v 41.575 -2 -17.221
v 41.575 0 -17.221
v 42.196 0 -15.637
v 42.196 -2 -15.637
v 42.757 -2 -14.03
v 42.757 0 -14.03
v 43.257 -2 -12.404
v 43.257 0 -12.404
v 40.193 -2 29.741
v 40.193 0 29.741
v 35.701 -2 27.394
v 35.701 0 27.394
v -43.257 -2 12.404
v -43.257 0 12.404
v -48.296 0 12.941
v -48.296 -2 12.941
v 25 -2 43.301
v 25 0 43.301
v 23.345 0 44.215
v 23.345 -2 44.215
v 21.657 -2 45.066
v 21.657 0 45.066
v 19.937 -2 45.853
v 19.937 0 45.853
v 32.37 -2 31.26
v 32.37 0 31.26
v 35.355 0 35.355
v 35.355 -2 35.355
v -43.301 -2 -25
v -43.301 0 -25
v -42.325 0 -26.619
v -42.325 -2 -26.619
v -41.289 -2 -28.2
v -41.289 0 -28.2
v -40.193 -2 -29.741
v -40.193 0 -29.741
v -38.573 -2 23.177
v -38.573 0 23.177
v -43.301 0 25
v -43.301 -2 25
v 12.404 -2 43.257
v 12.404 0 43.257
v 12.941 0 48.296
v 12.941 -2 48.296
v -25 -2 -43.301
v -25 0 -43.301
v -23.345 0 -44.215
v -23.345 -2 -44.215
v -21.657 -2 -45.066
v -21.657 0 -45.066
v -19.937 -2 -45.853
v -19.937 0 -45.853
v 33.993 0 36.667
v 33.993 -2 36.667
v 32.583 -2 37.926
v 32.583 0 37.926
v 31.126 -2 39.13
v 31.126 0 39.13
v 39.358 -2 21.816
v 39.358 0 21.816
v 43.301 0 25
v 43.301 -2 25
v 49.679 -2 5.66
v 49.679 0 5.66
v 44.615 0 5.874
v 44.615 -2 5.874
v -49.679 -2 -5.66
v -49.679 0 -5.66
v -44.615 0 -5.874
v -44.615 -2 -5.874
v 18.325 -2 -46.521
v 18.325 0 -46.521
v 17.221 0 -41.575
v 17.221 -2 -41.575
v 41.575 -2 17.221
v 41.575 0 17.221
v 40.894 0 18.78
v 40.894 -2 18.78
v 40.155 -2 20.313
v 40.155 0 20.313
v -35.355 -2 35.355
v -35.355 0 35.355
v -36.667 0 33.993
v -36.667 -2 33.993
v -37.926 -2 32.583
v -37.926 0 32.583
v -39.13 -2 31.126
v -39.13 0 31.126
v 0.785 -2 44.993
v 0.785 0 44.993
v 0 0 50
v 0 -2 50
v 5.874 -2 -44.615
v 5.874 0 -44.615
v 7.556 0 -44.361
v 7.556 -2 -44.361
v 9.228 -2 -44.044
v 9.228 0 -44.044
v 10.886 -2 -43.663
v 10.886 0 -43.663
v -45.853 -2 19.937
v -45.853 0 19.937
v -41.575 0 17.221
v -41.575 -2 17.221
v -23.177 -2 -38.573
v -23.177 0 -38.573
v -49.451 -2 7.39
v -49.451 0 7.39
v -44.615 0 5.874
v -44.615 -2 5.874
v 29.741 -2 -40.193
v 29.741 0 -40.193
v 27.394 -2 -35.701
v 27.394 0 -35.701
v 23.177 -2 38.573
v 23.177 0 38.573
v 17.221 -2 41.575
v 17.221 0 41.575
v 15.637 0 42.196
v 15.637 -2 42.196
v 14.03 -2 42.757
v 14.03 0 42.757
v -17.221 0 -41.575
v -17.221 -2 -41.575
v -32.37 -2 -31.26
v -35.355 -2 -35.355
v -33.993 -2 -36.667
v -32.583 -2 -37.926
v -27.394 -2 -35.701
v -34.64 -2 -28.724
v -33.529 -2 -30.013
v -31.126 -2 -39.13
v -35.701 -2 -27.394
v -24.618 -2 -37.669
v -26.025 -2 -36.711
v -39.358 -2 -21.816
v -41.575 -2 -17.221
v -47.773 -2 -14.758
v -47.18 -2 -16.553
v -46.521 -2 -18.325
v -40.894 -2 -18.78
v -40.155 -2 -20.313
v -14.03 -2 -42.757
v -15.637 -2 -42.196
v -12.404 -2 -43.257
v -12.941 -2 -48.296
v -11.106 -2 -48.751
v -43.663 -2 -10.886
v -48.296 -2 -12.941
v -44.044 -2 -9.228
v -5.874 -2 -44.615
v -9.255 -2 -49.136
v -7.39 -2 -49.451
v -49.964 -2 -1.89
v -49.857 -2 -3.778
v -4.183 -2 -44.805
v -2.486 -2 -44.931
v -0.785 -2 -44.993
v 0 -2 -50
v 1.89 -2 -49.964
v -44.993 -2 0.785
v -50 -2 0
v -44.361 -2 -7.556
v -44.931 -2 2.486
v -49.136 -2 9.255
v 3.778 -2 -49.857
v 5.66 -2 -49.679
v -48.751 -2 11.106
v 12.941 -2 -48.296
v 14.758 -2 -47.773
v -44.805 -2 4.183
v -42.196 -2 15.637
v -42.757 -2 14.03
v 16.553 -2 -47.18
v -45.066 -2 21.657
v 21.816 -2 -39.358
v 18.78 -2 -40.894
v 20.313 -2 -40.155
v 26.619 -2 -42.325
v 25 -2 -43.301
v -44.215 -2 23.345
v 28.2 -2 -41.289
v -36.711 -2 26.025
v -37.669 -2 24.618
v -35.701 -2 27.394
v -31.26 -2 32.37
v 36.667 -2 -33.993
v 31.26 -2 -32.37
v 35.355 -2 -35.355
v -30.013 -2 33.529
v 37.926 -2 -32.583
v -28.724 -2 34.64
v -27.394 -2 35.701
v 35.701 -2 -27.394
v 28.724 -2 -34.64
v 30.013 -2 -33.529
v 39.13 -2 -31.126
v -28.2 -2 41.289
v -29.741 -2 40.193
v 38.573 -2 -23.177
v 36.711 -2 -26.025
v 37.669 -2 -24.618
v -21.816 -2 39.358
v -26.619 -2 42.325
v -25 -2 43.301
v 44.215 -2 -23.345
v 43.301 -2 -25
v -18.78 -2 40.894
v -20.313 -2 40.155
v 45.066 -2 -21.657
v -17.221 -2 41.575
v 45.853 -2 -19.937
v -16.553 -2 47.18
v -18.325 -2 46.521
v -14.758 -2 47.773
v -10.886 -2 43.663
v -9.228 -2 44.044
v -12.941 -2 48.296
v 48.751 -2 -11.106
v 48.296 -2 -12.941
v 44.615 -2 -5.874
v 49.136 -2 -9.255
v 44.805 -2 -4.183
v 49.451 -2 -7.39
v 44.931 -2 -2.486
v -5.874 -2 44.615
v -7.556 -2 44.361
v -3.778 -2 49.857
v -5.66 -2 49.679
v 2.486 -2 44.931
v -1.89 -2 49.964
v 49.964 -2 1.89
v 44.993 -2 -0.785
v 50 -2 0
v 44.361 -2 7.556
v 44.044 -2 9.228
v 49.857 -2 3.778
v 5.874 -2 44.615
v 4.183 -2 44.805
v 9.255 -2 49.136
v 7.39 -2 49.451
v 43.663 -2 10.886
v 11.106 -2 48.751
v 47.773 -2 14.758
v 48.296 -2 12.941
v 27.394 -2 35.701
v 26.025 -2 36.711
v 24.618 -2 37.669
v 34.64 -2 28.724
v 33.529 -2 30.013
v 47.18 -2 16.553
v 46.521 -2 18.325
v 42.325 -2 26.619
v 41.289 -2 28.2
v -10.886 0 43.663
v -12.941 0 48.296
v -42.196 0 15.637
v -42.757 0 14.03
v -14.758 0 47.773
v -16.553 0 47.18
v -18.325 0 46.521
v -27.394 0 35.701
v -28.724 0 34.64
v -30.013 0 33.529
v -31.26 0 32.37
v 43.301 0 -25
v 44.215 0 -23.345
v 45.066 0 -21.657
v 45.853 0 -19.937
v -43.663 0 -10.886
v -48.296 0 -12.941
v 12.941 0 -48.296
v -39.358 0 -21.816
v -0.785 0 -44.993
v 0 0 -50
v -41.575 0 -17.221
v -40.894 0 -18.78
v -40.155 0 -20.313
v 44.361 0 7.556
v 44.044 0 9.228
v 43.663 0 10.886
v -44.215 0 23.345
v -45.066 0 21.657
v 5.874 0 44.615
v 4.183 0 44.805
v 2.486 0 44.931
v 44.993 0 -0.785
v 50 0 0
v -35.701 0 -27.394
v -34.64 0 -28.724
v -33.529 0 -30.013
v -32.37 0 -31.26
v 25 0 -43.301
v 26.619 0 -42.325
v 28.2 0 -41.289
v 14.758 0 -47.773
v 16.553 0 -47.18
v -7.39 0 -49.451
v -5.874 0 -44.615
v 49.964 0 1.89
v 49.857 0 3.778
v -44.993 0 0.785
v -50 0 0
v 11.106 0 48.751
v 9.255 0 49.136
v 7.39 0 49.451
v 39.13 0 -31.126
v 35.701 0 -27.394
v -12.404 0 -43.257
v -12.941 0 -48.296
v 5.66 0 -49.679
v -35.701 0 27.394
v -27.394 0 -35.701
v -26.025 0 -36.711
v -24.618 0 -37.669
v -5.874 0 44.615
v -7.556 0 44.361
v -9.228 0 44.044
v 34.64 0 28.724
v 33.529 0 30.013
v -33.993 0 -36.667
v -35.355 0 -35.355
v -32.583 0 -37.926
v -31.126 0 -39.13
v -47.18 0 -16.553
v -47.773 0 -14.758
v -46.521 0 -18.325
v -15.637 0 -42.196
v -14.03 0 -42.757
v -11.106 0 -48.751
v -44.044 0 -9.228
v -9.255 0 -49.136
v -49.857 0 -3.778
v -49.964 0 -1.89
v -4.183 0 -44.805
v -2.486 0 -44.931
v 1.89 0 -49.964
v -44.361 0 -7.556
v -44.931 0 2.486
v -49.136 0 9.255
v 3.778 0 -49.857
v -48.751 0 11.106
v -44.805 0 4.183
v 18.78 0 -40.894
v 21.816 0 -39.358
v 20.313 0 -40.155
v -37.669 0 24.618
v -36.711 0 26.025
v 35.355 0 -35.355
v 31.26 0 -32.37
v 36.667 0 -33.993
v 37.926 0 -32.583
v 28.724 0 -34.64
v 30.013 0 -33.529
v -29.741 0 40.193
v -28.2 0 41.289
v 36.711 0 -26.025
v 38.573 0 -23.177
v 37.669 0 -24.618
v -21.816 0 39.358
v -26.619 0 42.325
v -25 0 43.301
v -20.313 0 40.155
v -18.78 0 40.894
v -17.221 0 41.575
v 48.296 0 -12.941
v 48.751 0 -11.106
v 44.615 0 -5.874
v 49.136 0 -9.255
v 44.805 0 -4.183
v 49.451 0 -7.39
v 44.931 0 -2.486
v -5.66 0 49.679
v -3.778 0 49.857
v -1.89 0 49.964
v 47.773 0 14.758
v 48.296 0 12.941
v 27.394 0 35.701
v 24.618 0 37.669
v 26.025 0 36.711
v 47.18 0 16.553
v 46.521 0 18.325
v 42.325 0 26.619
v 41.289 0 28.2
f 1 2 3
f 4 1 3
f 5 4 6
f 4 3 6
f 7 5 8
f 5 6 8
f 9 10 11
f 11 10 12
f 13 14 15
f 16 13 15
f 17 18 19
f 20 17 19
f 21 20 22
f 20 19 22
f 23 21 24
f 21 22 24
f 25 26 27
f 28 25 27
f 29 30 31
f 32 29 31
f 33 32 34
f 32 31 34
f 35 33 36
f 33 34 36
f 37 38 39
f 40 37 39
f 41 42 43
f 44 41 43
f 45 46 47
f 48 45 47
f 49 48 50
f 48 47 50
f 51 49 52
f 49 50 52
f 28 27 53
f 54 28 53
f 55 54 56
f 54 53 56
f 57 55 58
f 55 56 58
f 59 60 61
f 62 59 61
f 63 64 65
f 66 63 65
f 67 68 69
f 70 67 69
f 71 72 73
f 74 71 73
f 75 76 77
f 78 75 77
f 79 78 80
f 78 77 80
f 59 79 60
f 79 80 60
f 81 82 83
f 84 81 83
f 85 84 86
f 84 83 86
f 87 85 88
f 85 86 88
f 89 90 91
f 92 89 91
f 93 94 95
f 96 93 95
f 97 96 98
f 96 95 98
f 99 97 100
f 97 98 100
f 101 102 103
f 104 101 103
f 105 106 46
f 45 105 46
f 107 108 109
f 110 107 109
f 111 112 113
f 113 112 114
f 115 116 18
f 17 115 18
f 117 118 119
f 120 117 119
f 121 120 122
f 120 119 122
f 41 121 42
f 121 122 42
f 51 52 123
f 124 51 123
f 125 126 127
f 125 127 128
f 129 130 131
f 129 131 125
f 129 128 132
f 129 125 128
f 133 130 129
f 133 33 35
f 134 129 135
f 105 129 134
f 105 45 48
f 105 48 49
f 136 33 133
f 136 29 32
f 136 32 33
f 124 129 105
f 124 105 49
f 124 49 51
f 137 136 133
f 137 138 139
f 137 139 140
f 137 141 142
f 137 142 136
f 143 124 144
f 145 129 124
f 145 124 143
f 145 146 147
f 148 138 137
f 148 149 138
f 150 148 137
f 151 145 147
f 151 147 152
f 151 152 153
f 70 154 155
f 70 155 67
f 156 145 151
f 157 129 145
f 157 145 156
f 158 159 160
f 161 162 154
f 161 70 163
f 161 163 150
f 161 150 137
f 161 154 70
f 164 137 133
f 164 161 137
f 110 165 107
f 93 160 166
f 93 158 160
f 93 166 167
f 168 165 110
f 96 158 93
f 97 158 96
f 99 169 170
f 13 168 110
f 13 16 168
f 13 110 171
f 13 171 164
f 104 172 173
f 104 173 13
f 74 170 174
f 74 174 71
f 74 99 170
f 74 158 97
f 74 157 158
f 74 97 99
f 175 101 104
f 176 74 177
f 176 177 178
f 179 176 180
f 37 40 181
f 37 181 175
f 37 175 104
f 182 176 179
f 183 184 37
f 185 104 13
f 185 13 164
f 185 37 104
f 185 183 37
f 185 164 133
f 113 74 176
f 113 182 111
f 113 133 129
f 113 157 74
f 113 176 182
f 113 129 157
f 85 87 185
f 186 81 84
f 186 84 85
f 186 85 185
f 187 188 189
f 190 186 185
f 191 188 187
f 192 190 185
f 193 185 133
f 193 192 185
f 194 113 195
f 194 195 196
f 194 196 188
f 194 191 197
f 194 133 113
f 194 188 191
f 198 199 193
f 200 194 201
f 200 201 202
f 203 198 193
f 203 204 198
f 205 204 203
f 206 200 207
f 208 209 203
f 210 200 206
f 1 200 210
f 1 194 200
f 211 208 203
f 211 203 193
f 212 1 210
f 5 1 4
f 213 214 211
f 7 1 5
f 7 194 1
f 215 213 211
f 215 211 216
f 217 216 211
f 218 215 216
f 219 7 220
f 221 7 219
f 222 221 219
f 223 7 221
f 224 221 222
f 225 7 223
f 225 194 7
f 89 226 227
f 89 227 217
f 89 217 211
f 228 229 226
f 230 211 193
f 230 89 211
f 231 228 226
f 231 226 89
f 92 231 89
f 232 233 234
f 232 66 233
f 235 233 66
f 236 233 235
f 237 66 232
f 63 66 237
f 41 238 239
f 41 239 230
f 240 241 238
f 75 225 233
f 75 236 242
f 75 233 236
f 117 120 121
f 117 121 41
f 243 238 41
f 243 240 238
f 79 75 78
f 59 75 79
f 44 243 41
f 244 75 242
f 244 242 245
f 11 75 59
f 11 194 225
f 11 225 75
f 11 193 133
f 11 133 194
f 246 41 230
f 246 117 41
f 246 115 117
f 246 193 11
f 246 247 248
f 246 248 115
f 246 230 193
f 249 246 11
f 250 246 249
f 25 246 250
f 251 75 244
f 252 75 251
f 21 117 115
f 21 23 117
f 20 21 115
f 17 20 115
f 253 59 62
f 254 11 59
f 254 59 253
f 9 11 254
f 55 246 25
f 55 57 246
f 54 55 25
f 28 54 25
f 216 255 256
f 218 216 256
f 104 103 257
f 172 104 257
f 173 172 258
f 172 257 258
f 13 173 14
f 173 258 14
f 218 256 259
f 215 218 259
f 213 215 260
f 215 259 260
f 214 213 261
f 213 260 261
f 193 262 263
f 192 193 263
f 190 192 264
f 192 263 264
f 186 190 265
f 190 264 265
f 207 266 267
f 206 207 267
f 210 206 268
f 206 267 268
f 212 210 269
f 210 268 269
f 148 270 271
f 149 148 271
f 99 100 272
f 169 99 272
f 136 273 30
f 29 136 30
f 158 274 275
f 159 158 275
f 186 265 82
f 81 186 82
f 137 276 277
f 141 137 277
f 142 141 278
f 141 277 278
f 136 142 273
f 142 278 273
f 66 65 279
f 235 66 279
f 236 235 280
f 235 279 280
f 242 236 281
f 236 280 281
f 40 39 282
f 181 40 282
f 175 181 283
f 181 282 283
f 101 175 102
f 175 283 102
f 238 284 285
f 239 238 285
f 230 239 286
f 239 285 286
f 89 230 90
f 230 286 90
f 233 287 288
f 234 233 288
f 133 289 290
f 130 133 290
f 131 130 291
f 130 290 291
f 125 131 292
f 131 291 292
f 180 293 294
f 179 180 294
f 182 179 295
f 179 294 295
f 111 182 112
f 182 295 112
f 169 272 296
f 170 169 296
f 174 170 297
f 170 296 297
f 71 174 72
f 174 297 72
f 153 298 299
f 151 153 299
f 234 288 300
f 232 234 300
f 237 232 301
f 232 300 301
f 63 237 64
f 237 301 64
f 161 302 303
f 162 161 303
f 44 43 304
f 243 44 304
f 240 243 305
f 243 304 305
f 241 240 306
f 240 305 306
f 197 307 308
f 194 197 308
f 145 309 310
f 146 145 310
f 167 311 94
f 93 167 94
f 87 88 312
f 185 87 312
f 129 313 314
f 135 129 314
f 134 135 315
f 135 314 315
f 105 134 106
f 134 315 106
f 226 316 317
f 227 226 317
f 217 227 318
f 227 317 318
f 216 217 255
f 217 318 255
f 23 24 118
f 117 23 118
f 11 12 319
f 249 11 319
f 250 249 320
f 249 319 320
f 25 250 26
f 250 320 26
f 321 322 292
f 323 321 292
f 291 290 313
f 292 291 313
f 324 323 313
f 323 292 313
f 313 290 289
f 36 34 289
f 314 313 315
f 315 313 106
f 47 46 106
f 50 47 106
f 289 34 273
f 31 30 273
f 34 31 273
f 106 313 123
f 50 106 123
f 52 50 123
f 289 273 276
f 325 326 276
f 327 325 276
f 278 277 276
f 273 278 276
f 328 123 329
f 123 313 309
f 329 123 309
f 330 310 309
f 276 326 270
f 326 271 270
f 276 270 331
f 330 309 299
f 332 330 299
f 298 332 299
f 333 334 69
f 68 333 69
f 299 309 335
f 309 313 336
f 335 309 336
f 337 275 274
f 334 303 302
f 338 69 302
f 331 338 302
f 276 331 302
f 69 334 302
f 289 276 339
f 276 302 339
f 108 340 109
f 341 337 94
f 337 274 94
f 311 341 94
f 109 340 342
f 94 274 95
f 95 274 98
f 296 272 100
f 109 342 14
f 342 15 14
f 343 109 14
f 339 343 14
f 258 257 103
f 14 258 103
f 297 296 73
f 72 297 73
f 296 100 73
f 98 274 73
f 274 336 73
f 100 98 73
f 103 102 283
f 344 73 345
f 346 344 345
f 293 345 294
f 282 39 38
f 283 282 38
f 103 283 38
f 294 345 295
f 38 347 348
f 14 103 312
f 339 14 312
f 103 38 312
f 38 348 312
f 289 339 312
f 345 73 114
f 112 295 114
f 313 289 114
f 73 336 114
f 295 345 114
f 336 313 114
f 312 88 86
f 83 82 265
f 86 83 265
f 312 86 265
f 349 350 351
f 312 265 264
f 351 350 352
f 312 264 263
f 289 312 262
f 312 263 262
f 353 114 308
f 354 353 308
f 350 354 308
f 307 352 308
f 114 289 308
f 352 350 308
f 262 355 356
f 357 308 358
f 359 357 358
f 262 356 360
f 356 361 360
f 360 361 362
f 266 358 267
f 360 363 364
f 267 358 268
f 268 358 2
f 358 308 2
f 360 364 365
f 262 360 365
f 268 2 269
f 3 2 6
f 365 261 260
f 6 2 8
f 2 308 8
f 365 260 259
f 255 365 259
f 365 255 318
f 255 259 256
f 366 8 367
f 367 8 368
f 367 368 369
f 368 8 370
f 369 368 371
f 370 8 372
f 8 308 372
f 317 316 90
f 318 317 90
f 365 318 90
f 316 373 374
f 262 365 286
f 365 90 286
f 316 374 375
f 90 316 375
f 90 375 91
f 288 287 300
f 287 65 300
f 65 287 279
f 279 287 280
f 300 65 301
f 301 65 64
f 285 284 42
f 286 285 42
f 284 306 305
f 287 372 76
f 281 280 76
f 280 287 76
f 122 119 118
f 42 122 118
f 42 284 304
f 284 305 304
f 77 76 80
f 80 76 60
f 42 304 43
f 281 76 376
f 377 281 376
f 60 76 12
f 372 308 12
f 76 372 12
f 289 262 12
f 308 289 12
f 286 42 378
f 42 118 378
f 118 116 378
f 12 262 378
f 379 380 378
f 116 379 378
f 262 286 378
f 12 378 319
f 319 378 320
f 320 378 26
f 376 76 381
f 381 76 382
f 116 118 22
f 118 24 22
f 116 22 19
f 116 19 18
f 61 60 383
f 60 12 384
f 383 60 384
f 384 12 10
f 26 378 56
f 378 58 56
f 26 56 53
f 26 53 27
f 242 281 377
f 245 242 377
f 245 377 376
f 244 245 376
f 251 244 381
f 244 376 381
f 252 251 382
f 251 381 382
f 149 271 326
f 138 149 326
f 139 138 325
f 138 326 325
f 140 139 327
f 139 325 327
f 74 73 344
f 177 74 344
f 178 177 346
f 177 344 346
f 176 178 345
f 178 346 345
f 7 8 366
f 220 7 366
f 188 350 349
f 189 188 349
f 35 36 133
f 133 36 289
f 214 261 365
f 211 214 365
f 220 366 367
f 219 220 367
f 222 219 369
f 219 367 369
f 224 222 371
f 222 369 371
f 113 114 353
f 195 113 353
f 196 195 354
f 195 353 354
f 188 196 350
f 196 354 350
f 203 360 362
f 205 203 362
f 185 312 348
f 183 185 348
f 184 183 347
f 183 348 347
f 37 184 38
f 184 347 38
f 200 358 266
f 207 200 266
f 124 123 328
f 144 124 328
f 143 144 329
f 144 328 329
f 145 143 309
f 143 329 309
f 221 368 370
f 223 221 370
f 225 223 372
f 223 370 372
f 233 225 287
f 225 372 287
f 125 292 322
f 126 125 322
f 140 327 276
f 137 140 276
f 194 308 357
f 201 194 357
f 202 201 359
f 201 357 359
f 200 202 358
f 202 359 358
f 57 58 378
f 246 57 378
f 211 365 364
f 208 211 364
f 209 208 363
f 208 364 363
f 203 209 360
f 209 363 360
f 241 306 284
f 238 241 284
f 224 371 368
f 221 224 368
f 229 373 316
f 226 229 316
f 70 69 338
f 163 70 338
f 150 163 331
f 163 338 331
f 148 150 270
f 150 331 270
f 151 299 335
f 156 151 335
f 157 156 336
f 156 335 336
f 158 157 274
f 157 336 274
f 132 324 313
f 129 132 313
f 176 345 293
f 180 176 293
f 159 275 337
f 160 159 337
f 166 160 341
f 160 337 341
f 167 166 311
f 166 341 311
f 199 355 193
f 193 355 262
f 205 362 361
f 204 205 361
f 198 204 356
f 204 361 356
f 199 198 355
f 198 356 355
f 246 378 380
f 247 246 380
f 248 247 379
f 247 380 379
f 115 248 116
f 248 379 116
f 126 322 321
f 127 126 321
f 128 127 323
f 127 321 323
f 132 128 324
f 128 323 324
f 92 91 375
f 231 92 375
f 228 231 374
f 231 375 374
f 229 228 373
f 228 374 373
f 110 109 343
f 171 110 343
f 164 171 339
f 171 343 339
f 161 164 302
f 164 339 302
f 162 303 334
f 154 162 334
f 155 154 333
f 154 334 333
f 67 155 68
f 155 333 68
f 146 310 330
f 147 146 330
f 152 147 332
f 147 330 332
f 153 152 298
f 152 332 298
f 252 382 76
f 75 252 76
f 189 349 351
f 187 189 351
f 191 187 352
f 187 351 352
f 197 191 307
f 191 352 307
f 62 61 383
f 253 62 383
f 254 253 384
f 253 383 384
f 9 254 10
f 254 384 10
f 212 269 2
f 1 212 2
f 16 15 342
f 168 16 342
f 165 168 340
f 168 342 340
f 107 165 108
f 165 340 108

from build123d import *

# Parameters (mm, degrees)
F1_DEPTH = 2


with BuildPart() as f1:
    # F0 (on Front) → F1 (new body)
    with BuildSketch(Plane.XZ):
        with BuildLine():
            Line((-5.660161, 49.678593), (-5.873679, 44.615019))
            ThreePointArc((-5.873679, 44.615019), (-8.393582, 44.210268), (-10.886485, 43.663308))
            Line((-10.886485, 43.663308), (-12.940952, 48.296291))
            ThreePointArc((-12.940952, 48.296291), (-15.65819, 47.484956), (-18.325061, 46.520878))
            Line((-18.325061, 46.520878), (-17.220754, 41.574579))
            ThreePointArc((-17.220754, 41.574579), (-19.550037, 40.531421), (-21.816433, 39.357887))
            Line((-21.816433, 39.357887), (-25, 43.30127))
            ThreePointArc((-25, 43.30127), (-27.414661, 41.814308), (-29.741139, 40.192843))
            Line((-29.741139, 40.192843), (-27.394264, 35.7009))
            ThreePointArc((-27.394264, 35.7009), (-29.374189, 34.090424), (-31.259627, 32.370291))
            Line((-31.259627, 32.370291), (-35.355339, 35.355339))
            ThreePointArc((-35.355339, 35.355339), (-37.302869, 33.294083), (-39.130408, 31.125732))
            Line((-39.130408, 31.125732), (-35.7009, 27.394264))
            ThreePointArc((-35.7009, 27.394264), (-37.196539, 25.326222), (-38.572529, 23.176713))
            Line((-38.572529, 23.176713), (-43.30127, 25))
            ThreePointArc((-43.30127, 25), (-44.648947, 22.504922), (-45.853004, 19.937453))
            Line((-45.853004, 19.937453), (-41.574579, 17.220754))
            ThreePointArc((-41.574579, 17.220754), (-42.484006, 14.836079), (-43.256776, 12.403681))
            Line((-43.256776, 12.403681), (-48.296291, 12.940952))
            ThreePointArc((-48.296291, 12.940952), (-48.952274, 10.182088), (-49.450793, 7.390471))
            Line((-49.450793, 7.390471), (-44.615019, 5.873679))
            ThreePointArc((-44.615019, 5.873679), (-44.876258, 3.334882), (-44.993146, 0.785358))
            Line((-44.993146, 0.785358), (-50, 0))
            ThreePointArc((-50, 0), (-49.919584, -2.834639), (-49.678593, -5.660161))
            Line((-49.678593, -5.660161), (-44.615019, -5.873679))
            ThreePointArc((-44.615019, -5.873679), (-44.210268, -8.393582), (-43.663308, -10.886485))
            Line((-43.663308, -10.886485), (-48.296291, -12.940952))
            ThreePointArc((-48.296291, -12.940952), (-47.484956, -15.65819), (-46.520878, -18.325061))
            Line((-46.520878, -18.325061), (-41.574579, -17.220754))
            ThreePointArc((-41.574579, -17.220754), (-40.531421, -19.550037), (-39.357887, -21.816433))
            Line((-39.357887, -21.816433), (-43.30127, -25))
            ThreePointArc((-43.30127, -25), (-41.814308, -27.414661), (-40.192843, -29.741139))
            Line((-40.192843, -29.741139), (-35.7009, -27.394264))
            ThreePointArc((-35.7009, -27.394264), (-34.090424, -29.374189), (-32.370291, -31.259627))
            Line((-32.370291, -31.259627), (-35.355339, -35.355339))
            ThreePointArc((-35.355339, -35.355339), (-33.294083, -37.302869), (-31.125732, -39.130408))
            Line((-31.125732, -39.130408), (-27.394264, -35.7009))
            ThreePointArc((-27.394264, -35.7009), (-25.326222, -37.196539), (-23.176713, -38.572529))
            Line((-23.176713, -38.572529), (-25, -43.30127))
            ThreePointArc((-25, -43.30127), (-22.504922, -44.648947), (-19.937453, -45.853004))
            Line((-19.937453, -45.853004), (-17.220754, -41.574579))
            ThreePointArc((-17.220754, -41.574579), (-14.836079, -42.484006), (-12.403681, -43.256776))
            Line((-12.403681, -43.256776), (-12.940952, -48.296291))
            ThreePointArc((-12.940952, -48.296291), (-10.182088, -48.952274), (-7.390471, -49.450793))
            Line((-7.390471, -49.450793), (-5.873679, -44.615019))
            ThreePointArc((-5.873679, -44.615019), (-3.334882, -44.876258), (-0.785358, -44.993146))
            Line((-0.785358, -44.993146), (0, -50))
            ThreePointArc((0, -50), (2.834639, -49.919584), (5.660161, -49.678593))
            Line((5.660161, -49.678593), (5.873679, -44.615019))
            ThreePointArc((5.873679, -44.615019), (8.393582, -44.210268), (10.886485, -43.663308))
            Line((10.886485, -43.663308), (12.940952, -48.296291))
            ThreePointArc((12.940952, -48.296291), (15.65819, -47.484956), (18.325061, -46.520878))
            Line((18.325061, -46.520878), (17.220754, -41.574579))
            ThreePointArc((17.220754, -41.574579), (19.550037, -40.531421), (21.816433, -39.357887))
            Line((21.816433, -39.357887), (25, -43.30127))
            ThreePointArc((25, -43.30127), (27.414661, -41.814308), (29.741139, -40.192843))
            Line((29.741139, -40.192843), (27.394264, -35.7009))
            ThreePointArc((27.394264, -35.7009), (29.374189, -34.090424), (31.259627, -32.370291))
            Line((31.259627, -32.370291), (35.355339, -35.355339))
            ThreePointArc((35.355339, -35.355339), (37.302869, -33.294083), (39.130408, -31.125732))
            Line((39.130408, -31.125732), (35.7009, -27.394264))
            ThreePointArc((35.7009, -27.394264), (37.196539, -25.326222), (38.572529, -23.176713))
            Line((38.572529, -23.176713), (43.30127, -25))
            ThreePointArc((43.30127, -25), (44.648947, -22.504922), (45.853004, -19.937453))
            Line((45.853004, -19.937453), (41.574579, -17.220754))
            ThreePointArc((41.574579, -17.220754), (42.484006, -14.836079), (43.256776, -12.403681))
            Line((43.256776, -12.403681), (48.296291, -12.940952))
            ThreePointArc((48.296291, -12.940952), (48.952274, -10.182088), (49.450793, -7.390471))
            Line((49.450793, -7.390471), (44.615019, -5.873679))
            ThreePointArc((44.615019, -5.873679), (44.876258, -3.334882), (44.993146, -0.785358))
            Line((44.993146, -0.785358), (50, 0))
            ThreePointArc((50, 0), (49.919584, 2.834639), (49.678593, 5.660161))
            Line((49.678593, 5.660161), (44.615019, 5.873679))
            ThreePointArc((44.615019, 5.873679), (44.210268, 8.393582), (43.663308, 10.886485))
            Line((43.663308, 10.886485), (48.296291, 12.940952))
            ThreePointArc((48.296291, 12.940952), (47.484956, 15.65819), (46.520878, 18.325061))
            Line((46.520878, 18.325061), (41.574579, 17.220754))
            ThreePointArc((41.574579, 17.220754), (40.531421, 19.550037), (39.357887, 21.816433))
            Line((39.357887, 21.816433), (43.30127, 25))
            ThreePointArc((43.30127, 25), (41.814308, 27.414661), (40.192843, 29.741139))
            Line((40.192843, 29.741139), (35.7009, 27.394264))
            ThreePointArc((35.7009, 27.394264), (34.090424, 29.374189), (32.370291, 31.259627))
            Line((32.370291, 31.259627), (35.355339, 35.355339))
            ThreePointArc((35.355339, 35.355339), (33.294083, 37.302869), (31.125732, 39.130408))
            Line((31.125732, 39.130408), (27.394264, 35.7009))
            ThreePointArc((27.394264, 35.7009), (25.326222, 37.196539), (23.176713, 38.572529))
            Line((23.176713, 38.572529), (25, 43.30127))
            ThreePointArc((25, 43.30127), (22.504922, 44.648947), (19.937453, 45.853004))
            Line((19.937453, 45.853004), (17.220754, 41.574579))
            ThreePointArc((17.220754, 41.574579), (14.836079, 42.484006), (12.403681, 43.256776))
            Line((12.403681, 43.256776), (12.940952, 48.296291))
            ThreePointArc((12.940952, 48.296291), (10.182088, 48.952274), (7.390471, 49.450793))
            Line((7.390471, 49.450793), (5.873679, 44.615019))
            ThreePointArc((5.873679, 44.615019), (3.334882, 44.876258), (0.785358, 44.993146))
            Line((0.785358, 44.993146), (0, 50))
            ThreePointArc((0, 50), (-2.834639, 49.919584), (-5.660161, 49.678593))
        make_face()
    extrude(amount=F1_DEPTH)


solid = f1.part
